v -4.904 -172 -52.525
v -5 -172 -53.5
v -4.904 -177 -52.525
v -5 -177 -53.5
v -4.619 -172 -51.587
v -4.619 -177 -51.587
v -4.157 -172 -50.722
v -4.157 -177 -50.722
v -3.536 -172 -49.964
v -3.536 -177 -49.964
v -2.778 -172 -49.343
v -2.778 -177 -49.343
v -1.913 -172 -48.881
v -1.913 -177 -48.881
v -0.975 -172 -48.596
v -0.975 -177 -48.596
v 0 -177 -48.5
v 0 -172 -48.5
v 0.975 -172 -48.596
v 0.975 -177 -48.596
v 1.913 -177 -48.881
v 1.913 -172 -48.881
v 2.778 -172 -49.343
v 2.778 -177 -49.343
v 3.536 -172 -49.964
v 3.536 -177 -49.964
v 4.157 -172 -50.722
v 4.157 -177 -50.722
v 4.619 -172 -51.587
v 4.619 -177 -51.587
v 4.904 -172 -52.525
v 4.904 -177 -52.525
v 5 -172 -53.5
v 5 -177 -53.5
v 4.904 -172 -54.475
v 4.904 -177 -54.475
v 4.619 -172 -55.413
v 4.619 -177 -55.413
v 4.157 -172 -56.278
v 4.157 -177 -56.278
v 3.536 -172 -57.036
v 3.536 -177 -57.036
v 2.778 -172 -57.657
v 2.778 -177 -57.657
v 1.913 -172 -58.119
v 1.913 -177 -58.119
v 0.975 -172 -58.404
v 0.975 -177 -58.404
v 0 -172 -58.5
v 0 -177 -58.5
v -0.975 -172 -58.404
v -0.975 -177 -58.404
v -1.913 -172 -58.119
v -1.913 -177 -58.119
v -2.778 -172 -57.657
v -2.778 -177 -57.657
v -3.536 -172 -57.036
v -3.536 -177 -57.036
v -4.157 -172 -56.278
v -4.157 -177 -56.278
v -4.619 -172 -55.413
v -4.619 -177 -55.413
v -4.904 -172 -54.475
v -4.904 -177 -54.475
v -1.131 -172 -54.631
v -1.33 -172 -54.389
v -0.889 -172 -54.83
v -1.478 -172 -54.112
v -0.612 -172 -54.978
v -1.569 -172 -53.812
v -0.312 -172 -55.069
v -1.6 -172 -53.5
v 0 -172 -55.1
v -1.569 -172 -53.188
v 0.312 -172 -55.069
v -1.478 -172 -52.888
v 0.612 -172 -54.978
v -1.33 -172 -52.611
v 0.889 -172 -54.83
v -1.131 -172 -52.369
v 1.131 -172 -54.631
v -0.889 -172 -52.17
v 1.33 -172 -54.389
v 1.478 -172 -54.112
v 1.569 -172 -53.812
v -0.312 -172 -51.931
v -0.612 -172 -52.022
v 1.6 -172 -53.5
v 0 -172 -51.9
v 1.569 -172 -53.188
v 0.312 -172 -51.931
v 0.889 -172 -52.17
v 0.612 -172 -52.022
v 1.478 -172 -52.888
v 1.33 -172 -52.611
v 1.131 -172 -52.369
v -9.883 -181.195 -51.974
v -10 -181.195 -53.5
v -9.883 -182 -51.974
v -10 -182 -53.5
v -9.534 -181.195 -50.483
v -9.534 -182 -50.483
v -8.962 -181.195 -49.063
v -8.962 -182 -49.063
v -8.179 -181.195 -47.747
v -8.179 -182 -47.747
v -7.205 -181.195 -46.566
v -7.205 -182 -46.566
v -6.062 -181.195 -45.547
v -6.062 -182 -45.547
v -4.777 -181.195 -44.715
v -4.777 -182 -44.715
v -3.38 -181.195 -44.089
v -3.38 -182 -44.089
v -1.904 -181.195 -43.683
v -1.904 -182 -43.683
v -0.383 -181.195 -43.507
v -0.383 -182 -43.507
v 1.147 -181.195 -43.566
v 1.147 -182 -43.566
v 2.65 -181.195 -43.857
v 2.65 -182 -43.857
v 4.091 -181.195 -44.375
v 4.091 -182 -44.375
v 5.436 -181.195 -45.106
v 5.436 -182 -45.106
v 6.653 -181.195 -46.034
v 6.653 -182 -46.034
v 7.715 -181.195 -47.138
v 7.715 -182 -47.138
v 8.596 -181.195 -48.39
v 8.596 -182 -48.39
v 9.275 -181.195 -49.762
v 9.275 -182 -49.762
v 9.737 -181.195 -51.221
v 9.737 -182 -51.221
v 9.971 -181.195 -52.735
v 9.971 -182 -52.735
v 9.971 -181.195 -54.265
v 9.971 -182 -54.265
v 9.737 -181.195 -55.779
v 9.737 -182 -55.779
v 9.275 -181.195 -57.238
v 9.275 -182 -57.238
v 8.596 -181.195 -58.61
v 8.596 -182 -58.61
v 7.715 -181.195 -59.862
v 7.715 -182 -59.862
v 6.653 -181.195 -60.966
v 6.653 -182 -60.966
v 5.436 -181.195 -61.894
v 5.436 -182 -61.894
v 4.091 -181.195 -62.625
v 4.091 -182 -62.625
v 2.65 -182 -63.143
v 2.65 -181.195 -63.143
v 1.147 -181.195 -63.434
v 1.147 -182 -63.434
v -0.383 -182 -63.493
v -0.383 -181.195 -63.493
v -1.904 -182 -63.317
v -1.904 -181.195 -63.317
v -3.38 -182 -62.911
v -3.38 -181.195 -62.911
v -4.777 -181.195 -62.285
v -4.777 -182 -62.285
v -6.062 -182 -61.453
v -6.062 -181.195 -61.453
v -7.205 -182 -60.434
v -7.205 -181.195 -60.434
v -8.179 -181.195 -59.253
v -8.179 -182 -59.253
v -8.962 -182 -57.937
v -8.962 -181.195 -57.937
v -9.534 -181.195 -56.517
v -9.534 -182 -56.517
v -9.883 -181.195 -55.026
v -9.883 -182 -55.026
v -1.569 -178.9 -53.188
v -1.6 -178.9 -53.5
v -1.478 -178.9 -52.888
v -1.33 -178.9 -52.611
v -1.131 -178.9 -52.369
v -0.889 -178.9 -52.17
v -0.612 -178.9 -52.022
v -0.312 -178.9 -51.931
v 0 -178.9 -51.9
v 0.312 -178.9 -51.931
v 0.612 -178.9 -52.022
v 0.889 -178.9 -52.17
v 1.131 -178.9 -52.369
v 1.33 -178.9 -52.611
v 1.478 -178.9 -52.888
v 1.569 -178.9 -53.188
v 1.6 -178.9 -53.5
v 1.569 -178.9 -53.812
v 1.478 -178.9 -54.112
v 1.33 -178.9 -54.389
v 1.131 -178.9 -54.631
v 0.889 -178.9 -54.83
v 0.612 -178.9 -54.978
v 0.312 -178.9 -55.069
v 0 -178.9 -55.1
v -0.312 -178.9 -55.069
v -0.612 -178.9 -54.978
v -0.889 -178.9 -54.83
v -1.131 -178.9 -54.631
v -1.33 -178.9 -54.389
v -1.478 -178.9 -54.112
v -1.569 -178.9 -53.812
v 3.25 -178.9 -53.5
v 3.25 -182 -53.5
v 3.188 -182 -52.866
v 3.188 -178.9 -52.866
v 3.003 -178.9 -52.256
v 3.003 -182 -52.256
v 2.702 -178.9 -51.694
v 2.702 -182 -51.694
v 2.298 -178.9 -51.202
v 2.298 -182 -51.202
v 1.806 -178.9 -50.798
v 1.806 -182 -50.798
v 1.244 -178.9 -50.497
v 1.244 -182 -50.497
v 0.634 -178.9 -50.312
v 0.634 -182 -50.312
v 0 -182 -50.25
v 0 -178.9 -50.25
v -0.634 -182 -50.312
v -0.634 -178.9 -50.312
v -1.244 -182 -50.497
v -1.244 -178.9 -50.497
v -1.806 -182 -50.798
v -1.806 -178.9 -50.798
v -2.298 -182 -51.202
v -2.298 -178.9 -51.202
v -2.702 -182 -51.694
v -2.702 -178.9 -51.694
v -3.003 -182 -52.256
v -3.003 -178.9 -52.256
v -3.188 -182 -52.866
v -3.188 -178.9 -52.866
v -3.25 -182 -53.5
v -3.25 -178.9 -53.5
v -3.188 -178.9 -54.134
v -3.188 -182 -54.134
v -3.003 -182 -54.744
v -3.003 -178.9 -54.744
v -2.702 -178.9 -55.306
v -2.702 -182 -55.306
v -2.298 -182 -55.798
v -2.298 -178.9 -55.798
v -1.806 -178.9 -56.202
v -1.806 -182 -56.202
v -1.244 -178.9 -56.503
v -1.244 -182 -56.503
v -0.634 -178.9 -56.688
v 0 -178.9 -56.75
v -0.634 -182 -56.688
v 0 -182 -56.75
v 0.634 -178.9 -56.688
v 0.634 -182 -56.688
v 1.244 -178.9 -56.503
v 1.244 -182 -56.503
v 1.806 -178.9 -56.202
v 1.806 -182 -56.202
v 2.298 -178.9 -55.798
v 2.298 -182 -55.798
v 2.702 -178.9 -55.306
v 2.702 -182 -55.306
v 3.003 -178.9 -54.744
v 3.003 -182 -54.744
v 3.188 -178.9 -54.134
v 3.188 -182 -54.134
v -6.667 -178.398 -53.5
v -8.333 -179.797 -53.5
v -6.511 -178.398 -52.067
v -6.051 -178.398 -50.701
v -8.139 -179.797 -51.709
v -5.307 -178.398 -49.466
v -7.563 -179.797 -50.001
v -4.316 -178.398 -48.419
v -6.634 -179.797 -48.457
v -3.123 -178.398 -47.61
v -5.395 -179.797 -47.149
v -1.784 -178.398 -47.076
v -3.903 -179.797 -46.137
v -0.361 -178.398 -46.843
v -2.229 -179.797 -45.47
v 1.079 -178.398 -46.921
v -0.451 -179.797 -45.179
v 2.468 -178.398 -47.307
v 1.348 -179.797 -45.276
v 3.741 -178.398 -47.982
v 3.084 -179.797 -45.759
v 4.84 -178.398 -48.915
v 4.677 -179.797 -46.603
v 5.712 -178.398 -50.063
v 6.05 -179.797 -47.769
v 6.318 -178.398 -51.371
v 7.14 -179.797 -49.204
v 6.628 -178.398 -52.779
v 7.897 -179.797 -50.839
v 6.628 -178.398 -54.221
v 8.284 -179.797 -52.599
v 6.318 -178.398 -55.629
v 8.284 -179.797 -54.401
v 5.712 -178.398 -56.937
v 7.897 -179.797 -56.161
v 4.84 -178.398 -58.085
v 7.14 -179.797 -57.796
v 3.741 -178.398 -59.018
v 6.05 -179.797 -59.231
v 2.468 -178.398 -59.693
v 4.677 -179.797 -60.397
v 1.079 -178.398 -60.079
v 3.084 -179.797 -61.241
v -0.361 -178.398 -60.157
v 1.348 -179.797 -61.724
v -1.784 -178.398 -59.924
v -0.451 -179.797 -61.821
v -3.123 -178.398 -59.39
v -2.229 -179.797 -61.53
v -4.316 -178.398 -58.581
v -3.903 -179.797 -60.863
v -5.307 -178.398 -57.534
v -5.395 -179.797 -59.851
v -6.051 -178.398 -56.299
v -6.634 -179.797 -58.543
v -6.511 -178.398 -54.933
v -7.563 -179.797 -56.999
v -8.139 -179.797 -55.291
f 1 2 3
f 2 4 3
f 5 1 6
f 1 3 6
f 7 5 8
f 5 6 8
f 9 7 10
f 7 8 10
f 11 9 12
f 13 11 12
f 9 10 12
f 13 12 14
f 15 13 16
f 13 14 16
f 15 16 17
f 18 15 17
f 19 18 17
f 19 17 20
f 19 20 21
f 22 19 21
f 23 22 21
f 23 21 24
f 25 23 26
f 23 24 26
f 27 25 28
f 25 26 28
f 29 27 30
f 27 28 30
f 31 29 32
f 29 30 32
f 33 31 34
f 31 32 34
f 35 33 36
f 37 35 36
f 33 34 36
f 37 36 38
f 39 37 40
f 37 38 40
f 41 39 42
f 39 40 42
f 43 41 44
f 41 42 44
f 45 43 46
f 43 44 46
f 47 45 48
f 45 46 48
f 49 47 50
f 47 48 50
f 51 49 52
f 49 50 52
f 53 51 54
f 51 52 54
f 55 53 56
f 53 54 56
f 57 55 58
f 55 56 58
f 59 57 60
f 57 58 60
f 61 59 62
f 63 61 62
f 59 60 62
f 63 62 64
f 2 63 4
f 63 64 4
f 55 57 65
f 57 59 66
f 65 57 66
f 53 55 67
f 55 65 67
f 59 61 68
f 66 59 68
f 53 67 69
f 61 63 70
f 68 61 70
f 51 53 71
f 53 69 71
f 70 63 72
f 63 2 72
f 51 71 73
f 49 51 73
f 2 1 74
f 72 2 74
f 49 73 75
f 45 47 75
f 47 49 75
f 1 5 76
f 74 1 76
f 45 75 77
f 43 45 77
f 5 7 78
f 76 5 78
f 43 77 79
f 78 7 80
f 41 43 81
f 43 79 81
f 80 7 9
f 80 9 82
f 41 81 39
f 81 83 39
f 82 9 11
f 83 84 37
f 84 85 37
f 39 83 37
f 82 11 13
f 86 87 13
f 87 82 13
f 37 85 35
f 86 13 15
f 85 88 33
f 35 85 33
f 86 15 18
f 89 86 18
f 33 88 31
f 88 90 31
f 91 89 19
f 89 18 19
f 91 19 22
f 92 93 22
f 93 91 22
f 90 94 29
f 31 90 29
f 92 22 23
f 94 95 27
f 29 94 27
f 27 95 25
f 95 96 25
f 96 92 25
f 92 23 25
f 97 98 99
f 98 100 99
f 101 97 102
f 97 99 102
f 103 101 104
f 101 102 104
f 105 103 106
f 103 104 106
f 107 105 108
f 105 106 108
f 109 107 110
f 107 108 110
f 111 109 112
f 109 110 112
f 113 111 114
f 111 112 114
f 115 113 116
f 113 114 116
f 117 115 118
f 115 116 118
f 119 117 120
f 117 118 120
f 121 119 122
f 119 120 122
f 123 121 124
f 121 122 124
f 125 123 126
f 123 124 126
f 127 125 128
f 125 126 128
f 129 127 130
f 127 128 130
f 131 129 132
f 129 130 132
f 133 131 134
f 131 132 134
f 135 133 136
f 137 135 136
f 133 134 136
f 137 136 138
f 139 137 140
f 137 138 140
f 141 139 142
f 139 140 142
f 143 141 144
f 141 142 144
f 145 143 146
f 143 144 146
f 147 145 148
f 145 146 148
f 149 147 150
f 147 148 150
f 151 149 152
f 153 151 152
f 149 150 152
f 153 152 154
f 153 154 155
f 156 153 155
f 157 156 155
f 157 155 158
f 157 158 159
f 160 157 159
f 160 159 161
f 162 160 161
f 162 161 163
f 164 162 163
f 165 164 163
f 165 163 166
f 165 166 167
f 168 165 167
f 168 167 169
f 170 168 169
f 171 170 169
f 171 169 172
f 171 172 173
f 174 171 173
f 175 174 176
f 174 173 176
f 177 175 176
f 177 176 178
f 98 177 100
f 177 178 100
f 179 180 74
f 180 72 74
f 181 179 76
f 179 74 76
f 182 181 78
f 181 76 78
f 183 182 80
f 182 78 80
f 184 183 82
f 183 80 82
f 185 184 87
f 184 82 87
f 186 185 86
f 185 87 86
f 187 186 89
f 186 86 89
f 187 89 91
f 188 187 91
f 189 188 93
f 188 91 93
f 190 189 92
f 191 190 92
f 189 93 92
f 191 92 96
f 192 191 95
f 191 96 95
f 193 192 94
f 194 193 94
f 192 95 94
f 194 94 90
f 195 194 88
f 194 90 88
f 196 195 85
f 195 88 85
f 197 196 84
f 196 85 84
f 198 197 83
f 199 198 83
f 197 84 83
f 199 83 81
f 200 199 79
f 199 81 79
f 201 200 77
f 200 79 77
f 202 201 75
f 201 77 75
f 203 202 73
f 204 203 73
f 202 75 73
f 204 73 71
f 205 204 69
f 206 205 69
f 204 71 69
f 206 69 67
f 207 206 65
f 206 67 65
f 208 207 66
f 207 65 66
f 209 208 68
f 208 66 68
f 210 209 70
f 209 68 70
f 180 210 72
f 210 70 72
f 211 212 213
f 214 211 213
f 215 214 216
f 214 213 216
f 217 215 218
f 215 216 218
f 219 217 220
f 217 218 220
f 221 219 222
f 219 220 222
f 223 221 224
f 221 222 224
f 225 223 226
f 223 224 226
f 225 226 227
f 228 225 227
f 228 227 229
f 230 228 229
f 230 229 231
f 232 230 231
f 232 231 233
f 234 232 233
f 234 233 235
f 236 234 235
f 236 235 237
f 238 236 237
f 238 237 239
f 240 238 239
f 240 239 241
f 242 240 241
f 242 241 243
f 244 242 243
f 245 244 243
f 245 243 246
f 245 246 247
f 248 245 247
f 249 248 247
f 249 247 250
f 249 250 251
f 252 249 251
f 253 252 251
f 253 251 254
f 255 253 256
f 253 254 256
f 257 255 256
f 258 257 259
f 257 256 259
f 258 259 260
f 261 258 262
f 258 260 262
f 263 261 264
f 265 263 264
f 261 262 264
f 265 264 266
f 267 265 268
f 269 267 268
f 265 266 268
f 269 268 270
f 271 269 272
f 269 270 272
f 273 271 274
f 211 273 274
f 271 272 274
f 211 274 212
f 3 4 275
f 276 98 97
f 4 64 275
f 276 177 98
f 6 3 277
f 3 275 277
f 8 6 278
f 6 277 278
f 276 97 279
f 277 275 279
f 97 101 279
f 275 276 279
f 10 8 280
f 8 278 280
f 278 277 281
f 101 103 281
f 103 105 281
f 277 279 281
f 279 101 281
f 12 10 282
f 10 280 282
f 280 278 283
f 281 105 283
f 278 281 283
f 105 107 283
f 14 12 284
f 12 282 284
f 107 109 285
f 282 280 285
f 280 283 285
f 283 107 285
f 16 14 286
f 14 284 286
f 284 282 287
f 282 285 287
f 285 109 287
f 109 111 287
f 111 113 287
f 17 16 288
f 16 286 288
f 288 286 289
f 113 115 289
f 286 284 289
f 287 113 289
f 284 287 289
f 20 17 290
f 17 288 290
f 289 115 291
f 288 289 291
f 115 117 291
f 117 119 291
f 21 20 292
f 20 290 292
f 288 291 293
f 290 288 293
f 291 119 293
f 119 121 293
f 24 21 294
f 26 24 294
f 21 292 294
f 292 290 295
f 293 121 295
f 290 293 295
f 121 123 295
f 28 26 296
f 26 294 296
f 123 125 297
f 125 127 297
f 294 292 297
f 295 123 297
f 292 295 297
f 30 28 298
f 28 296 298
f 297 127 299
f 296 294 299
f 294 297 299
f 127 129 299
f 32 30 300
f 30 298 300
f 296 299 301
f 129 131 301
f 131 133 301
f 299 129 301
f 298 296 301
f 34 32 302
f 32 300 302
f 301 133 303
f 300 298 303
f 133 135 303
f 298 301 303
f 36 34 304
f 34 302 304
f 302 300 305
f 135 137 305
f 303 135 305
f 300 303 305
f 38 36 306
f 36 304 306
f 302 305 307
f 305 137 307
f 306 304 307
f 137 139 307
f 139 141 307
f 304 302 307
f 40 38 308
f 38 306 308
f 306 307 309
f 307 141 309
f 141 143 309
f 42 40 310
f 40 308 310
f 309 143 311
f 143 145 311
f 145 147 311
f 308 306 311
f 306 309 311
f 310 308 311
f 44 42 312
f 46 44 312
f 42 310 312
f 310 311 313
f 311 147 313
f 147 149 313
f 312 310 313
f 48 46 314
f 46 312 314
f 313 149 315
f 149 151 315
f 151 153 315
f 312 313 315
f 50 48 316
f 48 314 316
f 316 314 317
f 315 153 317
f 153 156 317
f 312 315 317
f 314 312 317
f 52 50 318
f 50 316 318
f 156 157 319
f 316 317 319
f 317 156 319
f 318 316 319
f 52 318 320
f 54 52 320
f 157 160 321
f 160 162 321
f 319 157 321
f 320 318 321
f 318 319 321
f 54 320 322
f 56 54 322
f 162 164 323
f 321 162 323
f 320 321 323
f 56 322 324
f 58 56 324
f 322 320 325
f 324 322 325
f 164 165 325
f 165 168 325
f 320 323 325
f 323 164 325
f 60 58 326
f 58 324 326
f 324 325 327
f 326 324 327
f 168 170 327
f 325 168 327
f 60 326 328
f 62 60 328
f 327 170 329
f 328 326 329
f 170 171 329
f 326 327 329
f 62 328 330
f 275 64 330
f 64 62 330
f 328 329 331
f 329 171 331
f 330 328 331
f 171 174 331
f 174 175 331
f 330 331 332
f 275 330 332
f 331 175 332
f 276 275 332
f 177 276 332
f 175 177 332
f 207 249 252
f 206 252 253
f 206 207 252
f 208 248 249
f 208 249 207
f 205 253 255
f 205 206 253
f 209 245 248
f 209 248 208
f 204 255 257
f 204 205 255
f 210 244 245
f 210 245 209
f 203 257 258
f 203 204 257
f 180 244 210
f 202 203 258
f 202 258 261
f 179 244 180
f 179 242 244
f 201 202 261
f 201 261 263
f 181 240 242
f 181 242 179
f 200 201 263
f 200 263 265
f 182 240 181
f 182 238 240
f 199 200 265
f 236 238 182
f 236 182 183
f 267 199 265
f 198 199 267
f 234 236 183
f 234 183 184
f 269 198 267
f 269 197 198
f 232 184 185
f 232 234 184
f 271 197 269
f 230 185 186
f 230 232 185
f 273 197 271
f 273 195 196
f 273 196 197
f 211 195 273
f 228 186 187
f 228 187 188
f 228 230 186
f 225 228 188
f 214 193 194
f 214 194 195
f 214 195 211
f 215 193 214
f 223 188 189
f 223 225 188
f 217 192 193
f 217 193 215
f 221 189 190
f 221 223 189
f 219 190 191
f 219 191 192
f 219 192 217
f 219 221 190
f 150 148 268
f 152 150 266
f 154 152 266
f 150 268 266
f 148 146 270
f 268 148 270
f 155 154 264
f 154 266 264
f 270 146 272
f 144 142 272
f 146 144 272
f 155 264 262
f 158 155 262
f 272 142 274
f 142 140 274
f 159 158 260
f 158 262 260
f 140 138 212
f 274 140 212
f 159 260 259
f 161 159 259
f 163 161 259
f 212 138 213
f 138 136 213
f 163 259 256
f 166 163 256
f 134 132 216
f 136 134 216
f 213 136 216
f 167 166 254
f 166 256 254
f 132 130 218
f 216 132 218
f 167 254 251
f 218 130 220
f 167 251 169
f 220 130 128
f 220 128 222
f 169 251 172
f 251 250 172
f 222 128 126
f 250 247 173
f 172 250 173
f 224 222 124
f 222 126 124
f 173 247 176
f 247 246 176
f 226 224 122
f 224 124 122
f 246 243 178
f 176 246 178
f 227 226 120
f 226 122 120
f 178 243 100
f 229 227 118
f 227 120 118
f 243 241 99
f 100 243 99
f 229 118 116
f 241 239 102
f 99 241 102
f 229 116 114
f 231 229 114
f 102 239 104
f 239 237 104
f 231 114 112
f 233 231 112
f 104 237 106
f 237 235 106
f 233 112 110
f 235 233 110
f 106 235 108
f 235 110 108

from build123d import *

# Parameters (mm, degrees)
HOLE001_D           = 3.2
HOLE001_DEPTH       = 10
HOLE001_CBORE_D     = 6.5
HOLE001_CBORE_DEPTH = 3.1
HOLE001_TIPS_R      = 1.6


with BuildPart() as part:
    # Sketch060 → Revolution001 (revolve)
    with BuildSketch(Plane.XY):
        Polygon((0, 0), (-5, 0), (-5, -5), (-10, -9.195498), (-10, -10), (0, -10), align=None)
    revolve(axis=Axis((0, 0, 0), (0, 1, 0)))

    # Hole001
    with Locations(Plane.XZ.offset(10)):
        with Locations((0, 0)):
            CounterBoreHole(HOLE001_D / 2, HOLE001_CBORE_D / 2, HOLE001_CBORE_DEPTH, depth=HOLE001_DEPTH)

    # Hole001 tips → Hole001 tip 1 section 0
    with BuildSketch(Plane.XZ, mode=Mode.PRIVATE) as hole001_tip_1_s0:
        Circle(HOLE001_TIPS_R)
    loft([hole001_tip_1_s0.sketch, Vertex(0, 0.961377, 0)], mode=Mode.SUBTRACT)


with BuildPart() as part_1:
    # Body008 placement: moved
    add(part.part.moved(Location((0, -172, -53.5))))


solid = part_1.part
